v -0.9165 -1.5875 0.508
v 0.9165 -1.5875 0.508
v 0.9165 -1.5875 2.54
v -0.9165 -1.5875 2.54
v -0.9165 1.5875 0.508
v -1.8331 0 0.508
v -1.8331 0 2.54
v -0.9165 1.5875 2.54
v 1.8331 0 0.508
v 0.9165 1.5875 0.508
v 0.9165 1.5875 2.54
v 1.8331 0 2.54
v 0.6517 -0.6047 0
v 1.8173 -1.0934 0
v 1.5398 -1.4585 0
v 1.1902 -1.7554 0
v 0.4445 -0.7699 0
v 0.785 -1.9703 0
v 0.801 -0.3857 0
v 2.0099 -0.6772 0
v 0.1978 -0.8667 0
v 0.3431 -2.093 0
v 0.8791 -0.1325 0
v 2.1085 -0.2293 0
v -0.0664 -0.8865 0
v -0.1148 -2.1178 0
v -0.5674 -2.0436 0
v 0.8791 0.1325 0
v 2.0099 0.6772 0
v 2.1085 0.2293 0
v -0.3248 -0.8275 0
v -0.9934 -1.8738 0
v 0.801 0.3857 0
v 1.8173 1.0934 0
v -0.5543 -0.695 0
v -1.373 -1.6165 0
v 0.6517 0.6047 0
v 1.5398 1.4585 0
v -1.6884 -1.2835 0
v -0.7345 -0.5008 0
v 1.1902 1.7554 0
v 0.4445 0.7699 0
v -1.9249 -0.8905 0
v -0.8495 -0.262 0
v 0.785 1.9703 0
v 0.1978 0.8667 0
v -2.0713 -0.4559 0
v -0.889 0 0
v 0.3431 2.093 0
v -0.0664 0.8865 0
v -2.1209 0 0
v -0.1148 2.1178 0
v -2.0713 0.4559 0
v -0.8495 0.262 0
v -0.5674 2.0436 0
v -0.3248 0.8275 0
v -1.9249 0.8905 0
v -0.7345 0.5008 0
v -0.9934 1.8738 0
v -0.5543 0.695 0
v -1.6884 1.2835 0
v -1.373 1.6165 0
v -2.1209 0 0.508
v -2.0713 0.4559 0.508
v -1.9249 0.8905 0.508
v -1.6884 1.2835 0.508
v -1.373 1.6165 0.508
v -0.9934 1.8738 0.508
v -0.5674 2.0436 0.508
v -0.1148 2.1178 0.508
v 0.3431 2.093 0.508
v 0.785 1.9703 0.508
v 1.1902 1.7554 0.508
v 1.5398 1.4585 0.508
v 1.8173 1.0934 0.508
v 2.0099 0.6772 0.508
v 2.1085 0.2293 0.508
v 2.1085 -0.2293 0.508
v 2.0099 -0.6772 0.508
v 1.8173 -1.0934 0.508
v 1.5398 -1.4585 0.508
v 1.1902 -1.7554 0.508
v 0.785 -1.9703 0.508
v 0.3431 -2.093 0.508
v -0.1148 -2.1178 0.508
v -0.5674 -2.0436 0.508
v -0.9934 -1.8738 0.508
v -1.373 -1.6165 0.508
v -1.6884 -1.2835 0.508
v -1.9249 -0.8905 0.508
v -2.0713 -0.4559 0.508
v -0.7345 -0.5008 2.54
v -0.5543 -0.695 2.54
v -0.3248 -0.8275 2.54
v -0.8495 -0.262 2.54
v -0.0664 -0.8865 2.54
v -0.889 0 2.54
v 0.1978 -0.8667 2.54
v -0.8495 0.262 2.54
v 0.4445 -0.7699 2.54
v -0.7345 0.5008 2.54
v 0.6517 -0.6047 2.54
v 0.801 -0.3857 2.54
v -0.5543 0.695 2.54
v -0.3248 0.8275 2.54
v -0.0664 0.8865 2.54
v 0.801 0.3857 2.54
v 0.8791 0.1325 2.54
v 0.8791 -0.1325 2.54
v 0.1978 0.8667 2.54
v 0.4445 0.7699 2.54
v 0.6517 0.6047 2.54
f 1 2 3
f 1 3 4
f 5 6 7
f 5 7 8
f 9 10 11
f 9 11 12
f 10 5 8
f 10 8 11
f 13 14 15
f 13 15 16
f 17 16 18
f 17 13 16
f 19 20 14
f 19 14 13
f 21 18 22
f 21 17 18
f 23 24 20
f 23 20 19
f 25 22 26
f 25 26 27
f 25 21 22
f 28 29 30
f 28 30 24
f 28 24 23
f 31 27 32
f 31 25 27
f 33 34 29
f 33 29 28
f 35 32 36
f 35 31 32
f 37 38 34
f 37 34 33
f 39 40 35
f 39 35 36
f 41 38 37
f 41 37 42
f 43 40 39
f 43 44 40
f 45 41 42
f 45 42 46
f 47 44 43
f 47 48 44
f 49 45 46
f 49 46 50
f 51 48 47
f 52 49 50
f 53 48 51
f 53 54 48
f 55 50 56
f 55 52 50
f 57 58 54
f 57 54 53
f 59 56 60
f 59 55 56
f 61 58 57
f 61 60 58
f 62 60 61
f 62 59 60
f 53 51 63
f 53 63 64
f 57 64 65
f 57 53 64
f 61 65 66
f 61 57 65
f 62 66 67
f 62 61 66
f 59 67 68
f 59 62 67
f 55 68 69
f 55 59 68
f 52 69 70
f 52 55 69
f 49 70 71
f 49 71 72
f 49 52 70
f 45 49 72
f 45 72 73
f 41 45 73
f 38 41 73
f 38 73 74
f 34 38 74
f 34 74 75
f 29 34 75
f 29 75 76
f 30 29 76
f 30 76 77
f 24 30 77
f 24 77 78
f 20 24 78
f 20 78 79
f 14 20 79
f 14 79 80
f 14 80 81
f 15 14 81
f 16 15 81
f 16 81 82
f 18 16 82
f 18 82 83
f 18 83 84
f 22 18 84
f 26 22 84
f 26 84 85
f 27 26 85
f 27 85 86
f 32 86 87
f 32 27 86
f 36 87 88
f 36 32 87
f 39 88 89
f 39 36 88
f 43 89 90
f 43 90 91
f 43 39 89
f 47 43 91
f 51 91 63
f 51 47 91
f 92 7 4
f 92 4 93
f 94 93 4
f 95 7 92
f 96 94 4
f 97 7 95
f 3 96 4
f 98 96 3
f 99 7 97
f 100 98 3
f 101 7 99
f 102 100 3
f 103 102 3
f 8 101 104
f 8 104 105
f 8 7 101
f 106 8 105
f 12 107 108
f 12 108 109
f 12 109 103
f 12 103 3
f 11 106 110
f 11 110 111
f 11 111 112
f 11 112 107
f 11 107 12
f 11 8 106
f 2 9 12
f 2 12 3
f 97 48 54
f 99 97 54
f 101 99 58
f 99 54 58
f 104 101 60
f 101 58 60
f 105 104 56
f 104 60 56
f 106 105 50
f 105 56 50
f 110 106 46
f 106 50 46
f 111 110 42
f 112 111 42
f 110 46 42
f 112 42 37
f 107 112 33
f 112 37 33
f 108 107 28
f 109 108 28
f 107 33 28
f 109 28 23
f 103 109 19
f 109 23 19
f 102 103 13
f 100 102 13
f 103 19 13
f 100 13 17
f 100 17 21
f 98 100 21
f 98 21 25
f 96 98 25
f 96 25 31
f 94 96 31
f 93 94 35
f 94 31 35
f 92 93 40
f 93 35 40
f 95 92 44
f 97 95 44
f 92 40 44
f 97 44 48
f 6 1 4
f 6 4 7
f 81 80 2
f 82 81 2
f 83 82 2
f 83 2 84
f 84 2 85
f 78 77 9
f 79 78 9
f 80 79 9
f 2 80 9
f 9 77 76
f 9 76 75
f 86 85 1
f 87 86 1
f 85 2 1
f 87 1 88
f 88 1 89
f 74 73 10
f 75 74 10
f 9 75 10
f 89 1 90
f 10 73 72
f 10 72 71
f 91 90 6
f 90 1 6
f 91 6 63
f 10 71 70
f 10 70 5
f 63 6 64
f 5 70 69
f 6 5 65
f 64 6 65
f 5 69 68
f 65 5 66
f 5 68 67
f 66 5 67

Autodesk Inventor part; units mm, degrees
ref_plane "YZ Plane" through (0, 0, 0) normal (1, 0, 0) x (0, 1, 0)
ref_plane "XZ Plane" through (0, 0, 0) normal (0, 1, 0) x (-1, 0, 0)
ref_plane "XY Plane" through (0, 0, 0) normal (0, 0, 1) x (1, 0, 0)
sketch "Sketch1" plane through (0, 0, 0) normal (0, 0, 1) x (1, 0, 0)
  line L0 (0.9165, 1.5875) -> (1.8331, 0)
  line L1 (1.8331, 0) -> (0.9165, -1.5875)
  line L2 (0.9165, -1.5875) -> (-0.9165, -1.5875)
  line L3 (-0.9165, -1.5875) -> (-1.8331, 0)
  line L4 (-1.8331, 0) -> (-0.9165, 1.5875)
  line L5 (-0.9165, 1.5875) -> (0.9165, 1.5875)
  point P0 (0, 0)
  point P1 (0, 0)
  dimension "d0" = 3.175
extrude "Extrusion1" add sketch "Sketch1" along normal blind 2.54
sketch "Sketch2" plane through (0, 0, 0) normal (0, 0, -1) x (-1, 0, 0)
  line L0 (-0.9165, 1.5875) -> (-1.8331, 0) projected
  line L1 (-1.8331, 0) -> (-0.9165, -1.5875) projected
  line L2 (-0.9165, -1.5875) -> (0.9165, -1.5875) projected
  line L3 (0.9165, -1.5875) -> (1.8331, 0) projected
  line L4 (1.8331, 0) -> (0.9165, 1.5875) projected
  line L5 (0.9165, 1.5875) -> (-0.9165, 1.5875) projected
  circle A0 centre (0, 0) radius 2.1209
  dimension "d4" = 4.2418
extrude "Extrusion2" add sketch "Sketch2" against normal blind 0.508
sketch "Sketch3" plane through (0, 0, 0) normal (0, 0, -1) x (-1, 0, 0)
  circle A0 centre (0, 0) radius 0.889
  dimension "d7" = 1.778
extrude "Extrusion3" cut sketch "Sketch3" against normal through all
properties part number "MS21042-02"
